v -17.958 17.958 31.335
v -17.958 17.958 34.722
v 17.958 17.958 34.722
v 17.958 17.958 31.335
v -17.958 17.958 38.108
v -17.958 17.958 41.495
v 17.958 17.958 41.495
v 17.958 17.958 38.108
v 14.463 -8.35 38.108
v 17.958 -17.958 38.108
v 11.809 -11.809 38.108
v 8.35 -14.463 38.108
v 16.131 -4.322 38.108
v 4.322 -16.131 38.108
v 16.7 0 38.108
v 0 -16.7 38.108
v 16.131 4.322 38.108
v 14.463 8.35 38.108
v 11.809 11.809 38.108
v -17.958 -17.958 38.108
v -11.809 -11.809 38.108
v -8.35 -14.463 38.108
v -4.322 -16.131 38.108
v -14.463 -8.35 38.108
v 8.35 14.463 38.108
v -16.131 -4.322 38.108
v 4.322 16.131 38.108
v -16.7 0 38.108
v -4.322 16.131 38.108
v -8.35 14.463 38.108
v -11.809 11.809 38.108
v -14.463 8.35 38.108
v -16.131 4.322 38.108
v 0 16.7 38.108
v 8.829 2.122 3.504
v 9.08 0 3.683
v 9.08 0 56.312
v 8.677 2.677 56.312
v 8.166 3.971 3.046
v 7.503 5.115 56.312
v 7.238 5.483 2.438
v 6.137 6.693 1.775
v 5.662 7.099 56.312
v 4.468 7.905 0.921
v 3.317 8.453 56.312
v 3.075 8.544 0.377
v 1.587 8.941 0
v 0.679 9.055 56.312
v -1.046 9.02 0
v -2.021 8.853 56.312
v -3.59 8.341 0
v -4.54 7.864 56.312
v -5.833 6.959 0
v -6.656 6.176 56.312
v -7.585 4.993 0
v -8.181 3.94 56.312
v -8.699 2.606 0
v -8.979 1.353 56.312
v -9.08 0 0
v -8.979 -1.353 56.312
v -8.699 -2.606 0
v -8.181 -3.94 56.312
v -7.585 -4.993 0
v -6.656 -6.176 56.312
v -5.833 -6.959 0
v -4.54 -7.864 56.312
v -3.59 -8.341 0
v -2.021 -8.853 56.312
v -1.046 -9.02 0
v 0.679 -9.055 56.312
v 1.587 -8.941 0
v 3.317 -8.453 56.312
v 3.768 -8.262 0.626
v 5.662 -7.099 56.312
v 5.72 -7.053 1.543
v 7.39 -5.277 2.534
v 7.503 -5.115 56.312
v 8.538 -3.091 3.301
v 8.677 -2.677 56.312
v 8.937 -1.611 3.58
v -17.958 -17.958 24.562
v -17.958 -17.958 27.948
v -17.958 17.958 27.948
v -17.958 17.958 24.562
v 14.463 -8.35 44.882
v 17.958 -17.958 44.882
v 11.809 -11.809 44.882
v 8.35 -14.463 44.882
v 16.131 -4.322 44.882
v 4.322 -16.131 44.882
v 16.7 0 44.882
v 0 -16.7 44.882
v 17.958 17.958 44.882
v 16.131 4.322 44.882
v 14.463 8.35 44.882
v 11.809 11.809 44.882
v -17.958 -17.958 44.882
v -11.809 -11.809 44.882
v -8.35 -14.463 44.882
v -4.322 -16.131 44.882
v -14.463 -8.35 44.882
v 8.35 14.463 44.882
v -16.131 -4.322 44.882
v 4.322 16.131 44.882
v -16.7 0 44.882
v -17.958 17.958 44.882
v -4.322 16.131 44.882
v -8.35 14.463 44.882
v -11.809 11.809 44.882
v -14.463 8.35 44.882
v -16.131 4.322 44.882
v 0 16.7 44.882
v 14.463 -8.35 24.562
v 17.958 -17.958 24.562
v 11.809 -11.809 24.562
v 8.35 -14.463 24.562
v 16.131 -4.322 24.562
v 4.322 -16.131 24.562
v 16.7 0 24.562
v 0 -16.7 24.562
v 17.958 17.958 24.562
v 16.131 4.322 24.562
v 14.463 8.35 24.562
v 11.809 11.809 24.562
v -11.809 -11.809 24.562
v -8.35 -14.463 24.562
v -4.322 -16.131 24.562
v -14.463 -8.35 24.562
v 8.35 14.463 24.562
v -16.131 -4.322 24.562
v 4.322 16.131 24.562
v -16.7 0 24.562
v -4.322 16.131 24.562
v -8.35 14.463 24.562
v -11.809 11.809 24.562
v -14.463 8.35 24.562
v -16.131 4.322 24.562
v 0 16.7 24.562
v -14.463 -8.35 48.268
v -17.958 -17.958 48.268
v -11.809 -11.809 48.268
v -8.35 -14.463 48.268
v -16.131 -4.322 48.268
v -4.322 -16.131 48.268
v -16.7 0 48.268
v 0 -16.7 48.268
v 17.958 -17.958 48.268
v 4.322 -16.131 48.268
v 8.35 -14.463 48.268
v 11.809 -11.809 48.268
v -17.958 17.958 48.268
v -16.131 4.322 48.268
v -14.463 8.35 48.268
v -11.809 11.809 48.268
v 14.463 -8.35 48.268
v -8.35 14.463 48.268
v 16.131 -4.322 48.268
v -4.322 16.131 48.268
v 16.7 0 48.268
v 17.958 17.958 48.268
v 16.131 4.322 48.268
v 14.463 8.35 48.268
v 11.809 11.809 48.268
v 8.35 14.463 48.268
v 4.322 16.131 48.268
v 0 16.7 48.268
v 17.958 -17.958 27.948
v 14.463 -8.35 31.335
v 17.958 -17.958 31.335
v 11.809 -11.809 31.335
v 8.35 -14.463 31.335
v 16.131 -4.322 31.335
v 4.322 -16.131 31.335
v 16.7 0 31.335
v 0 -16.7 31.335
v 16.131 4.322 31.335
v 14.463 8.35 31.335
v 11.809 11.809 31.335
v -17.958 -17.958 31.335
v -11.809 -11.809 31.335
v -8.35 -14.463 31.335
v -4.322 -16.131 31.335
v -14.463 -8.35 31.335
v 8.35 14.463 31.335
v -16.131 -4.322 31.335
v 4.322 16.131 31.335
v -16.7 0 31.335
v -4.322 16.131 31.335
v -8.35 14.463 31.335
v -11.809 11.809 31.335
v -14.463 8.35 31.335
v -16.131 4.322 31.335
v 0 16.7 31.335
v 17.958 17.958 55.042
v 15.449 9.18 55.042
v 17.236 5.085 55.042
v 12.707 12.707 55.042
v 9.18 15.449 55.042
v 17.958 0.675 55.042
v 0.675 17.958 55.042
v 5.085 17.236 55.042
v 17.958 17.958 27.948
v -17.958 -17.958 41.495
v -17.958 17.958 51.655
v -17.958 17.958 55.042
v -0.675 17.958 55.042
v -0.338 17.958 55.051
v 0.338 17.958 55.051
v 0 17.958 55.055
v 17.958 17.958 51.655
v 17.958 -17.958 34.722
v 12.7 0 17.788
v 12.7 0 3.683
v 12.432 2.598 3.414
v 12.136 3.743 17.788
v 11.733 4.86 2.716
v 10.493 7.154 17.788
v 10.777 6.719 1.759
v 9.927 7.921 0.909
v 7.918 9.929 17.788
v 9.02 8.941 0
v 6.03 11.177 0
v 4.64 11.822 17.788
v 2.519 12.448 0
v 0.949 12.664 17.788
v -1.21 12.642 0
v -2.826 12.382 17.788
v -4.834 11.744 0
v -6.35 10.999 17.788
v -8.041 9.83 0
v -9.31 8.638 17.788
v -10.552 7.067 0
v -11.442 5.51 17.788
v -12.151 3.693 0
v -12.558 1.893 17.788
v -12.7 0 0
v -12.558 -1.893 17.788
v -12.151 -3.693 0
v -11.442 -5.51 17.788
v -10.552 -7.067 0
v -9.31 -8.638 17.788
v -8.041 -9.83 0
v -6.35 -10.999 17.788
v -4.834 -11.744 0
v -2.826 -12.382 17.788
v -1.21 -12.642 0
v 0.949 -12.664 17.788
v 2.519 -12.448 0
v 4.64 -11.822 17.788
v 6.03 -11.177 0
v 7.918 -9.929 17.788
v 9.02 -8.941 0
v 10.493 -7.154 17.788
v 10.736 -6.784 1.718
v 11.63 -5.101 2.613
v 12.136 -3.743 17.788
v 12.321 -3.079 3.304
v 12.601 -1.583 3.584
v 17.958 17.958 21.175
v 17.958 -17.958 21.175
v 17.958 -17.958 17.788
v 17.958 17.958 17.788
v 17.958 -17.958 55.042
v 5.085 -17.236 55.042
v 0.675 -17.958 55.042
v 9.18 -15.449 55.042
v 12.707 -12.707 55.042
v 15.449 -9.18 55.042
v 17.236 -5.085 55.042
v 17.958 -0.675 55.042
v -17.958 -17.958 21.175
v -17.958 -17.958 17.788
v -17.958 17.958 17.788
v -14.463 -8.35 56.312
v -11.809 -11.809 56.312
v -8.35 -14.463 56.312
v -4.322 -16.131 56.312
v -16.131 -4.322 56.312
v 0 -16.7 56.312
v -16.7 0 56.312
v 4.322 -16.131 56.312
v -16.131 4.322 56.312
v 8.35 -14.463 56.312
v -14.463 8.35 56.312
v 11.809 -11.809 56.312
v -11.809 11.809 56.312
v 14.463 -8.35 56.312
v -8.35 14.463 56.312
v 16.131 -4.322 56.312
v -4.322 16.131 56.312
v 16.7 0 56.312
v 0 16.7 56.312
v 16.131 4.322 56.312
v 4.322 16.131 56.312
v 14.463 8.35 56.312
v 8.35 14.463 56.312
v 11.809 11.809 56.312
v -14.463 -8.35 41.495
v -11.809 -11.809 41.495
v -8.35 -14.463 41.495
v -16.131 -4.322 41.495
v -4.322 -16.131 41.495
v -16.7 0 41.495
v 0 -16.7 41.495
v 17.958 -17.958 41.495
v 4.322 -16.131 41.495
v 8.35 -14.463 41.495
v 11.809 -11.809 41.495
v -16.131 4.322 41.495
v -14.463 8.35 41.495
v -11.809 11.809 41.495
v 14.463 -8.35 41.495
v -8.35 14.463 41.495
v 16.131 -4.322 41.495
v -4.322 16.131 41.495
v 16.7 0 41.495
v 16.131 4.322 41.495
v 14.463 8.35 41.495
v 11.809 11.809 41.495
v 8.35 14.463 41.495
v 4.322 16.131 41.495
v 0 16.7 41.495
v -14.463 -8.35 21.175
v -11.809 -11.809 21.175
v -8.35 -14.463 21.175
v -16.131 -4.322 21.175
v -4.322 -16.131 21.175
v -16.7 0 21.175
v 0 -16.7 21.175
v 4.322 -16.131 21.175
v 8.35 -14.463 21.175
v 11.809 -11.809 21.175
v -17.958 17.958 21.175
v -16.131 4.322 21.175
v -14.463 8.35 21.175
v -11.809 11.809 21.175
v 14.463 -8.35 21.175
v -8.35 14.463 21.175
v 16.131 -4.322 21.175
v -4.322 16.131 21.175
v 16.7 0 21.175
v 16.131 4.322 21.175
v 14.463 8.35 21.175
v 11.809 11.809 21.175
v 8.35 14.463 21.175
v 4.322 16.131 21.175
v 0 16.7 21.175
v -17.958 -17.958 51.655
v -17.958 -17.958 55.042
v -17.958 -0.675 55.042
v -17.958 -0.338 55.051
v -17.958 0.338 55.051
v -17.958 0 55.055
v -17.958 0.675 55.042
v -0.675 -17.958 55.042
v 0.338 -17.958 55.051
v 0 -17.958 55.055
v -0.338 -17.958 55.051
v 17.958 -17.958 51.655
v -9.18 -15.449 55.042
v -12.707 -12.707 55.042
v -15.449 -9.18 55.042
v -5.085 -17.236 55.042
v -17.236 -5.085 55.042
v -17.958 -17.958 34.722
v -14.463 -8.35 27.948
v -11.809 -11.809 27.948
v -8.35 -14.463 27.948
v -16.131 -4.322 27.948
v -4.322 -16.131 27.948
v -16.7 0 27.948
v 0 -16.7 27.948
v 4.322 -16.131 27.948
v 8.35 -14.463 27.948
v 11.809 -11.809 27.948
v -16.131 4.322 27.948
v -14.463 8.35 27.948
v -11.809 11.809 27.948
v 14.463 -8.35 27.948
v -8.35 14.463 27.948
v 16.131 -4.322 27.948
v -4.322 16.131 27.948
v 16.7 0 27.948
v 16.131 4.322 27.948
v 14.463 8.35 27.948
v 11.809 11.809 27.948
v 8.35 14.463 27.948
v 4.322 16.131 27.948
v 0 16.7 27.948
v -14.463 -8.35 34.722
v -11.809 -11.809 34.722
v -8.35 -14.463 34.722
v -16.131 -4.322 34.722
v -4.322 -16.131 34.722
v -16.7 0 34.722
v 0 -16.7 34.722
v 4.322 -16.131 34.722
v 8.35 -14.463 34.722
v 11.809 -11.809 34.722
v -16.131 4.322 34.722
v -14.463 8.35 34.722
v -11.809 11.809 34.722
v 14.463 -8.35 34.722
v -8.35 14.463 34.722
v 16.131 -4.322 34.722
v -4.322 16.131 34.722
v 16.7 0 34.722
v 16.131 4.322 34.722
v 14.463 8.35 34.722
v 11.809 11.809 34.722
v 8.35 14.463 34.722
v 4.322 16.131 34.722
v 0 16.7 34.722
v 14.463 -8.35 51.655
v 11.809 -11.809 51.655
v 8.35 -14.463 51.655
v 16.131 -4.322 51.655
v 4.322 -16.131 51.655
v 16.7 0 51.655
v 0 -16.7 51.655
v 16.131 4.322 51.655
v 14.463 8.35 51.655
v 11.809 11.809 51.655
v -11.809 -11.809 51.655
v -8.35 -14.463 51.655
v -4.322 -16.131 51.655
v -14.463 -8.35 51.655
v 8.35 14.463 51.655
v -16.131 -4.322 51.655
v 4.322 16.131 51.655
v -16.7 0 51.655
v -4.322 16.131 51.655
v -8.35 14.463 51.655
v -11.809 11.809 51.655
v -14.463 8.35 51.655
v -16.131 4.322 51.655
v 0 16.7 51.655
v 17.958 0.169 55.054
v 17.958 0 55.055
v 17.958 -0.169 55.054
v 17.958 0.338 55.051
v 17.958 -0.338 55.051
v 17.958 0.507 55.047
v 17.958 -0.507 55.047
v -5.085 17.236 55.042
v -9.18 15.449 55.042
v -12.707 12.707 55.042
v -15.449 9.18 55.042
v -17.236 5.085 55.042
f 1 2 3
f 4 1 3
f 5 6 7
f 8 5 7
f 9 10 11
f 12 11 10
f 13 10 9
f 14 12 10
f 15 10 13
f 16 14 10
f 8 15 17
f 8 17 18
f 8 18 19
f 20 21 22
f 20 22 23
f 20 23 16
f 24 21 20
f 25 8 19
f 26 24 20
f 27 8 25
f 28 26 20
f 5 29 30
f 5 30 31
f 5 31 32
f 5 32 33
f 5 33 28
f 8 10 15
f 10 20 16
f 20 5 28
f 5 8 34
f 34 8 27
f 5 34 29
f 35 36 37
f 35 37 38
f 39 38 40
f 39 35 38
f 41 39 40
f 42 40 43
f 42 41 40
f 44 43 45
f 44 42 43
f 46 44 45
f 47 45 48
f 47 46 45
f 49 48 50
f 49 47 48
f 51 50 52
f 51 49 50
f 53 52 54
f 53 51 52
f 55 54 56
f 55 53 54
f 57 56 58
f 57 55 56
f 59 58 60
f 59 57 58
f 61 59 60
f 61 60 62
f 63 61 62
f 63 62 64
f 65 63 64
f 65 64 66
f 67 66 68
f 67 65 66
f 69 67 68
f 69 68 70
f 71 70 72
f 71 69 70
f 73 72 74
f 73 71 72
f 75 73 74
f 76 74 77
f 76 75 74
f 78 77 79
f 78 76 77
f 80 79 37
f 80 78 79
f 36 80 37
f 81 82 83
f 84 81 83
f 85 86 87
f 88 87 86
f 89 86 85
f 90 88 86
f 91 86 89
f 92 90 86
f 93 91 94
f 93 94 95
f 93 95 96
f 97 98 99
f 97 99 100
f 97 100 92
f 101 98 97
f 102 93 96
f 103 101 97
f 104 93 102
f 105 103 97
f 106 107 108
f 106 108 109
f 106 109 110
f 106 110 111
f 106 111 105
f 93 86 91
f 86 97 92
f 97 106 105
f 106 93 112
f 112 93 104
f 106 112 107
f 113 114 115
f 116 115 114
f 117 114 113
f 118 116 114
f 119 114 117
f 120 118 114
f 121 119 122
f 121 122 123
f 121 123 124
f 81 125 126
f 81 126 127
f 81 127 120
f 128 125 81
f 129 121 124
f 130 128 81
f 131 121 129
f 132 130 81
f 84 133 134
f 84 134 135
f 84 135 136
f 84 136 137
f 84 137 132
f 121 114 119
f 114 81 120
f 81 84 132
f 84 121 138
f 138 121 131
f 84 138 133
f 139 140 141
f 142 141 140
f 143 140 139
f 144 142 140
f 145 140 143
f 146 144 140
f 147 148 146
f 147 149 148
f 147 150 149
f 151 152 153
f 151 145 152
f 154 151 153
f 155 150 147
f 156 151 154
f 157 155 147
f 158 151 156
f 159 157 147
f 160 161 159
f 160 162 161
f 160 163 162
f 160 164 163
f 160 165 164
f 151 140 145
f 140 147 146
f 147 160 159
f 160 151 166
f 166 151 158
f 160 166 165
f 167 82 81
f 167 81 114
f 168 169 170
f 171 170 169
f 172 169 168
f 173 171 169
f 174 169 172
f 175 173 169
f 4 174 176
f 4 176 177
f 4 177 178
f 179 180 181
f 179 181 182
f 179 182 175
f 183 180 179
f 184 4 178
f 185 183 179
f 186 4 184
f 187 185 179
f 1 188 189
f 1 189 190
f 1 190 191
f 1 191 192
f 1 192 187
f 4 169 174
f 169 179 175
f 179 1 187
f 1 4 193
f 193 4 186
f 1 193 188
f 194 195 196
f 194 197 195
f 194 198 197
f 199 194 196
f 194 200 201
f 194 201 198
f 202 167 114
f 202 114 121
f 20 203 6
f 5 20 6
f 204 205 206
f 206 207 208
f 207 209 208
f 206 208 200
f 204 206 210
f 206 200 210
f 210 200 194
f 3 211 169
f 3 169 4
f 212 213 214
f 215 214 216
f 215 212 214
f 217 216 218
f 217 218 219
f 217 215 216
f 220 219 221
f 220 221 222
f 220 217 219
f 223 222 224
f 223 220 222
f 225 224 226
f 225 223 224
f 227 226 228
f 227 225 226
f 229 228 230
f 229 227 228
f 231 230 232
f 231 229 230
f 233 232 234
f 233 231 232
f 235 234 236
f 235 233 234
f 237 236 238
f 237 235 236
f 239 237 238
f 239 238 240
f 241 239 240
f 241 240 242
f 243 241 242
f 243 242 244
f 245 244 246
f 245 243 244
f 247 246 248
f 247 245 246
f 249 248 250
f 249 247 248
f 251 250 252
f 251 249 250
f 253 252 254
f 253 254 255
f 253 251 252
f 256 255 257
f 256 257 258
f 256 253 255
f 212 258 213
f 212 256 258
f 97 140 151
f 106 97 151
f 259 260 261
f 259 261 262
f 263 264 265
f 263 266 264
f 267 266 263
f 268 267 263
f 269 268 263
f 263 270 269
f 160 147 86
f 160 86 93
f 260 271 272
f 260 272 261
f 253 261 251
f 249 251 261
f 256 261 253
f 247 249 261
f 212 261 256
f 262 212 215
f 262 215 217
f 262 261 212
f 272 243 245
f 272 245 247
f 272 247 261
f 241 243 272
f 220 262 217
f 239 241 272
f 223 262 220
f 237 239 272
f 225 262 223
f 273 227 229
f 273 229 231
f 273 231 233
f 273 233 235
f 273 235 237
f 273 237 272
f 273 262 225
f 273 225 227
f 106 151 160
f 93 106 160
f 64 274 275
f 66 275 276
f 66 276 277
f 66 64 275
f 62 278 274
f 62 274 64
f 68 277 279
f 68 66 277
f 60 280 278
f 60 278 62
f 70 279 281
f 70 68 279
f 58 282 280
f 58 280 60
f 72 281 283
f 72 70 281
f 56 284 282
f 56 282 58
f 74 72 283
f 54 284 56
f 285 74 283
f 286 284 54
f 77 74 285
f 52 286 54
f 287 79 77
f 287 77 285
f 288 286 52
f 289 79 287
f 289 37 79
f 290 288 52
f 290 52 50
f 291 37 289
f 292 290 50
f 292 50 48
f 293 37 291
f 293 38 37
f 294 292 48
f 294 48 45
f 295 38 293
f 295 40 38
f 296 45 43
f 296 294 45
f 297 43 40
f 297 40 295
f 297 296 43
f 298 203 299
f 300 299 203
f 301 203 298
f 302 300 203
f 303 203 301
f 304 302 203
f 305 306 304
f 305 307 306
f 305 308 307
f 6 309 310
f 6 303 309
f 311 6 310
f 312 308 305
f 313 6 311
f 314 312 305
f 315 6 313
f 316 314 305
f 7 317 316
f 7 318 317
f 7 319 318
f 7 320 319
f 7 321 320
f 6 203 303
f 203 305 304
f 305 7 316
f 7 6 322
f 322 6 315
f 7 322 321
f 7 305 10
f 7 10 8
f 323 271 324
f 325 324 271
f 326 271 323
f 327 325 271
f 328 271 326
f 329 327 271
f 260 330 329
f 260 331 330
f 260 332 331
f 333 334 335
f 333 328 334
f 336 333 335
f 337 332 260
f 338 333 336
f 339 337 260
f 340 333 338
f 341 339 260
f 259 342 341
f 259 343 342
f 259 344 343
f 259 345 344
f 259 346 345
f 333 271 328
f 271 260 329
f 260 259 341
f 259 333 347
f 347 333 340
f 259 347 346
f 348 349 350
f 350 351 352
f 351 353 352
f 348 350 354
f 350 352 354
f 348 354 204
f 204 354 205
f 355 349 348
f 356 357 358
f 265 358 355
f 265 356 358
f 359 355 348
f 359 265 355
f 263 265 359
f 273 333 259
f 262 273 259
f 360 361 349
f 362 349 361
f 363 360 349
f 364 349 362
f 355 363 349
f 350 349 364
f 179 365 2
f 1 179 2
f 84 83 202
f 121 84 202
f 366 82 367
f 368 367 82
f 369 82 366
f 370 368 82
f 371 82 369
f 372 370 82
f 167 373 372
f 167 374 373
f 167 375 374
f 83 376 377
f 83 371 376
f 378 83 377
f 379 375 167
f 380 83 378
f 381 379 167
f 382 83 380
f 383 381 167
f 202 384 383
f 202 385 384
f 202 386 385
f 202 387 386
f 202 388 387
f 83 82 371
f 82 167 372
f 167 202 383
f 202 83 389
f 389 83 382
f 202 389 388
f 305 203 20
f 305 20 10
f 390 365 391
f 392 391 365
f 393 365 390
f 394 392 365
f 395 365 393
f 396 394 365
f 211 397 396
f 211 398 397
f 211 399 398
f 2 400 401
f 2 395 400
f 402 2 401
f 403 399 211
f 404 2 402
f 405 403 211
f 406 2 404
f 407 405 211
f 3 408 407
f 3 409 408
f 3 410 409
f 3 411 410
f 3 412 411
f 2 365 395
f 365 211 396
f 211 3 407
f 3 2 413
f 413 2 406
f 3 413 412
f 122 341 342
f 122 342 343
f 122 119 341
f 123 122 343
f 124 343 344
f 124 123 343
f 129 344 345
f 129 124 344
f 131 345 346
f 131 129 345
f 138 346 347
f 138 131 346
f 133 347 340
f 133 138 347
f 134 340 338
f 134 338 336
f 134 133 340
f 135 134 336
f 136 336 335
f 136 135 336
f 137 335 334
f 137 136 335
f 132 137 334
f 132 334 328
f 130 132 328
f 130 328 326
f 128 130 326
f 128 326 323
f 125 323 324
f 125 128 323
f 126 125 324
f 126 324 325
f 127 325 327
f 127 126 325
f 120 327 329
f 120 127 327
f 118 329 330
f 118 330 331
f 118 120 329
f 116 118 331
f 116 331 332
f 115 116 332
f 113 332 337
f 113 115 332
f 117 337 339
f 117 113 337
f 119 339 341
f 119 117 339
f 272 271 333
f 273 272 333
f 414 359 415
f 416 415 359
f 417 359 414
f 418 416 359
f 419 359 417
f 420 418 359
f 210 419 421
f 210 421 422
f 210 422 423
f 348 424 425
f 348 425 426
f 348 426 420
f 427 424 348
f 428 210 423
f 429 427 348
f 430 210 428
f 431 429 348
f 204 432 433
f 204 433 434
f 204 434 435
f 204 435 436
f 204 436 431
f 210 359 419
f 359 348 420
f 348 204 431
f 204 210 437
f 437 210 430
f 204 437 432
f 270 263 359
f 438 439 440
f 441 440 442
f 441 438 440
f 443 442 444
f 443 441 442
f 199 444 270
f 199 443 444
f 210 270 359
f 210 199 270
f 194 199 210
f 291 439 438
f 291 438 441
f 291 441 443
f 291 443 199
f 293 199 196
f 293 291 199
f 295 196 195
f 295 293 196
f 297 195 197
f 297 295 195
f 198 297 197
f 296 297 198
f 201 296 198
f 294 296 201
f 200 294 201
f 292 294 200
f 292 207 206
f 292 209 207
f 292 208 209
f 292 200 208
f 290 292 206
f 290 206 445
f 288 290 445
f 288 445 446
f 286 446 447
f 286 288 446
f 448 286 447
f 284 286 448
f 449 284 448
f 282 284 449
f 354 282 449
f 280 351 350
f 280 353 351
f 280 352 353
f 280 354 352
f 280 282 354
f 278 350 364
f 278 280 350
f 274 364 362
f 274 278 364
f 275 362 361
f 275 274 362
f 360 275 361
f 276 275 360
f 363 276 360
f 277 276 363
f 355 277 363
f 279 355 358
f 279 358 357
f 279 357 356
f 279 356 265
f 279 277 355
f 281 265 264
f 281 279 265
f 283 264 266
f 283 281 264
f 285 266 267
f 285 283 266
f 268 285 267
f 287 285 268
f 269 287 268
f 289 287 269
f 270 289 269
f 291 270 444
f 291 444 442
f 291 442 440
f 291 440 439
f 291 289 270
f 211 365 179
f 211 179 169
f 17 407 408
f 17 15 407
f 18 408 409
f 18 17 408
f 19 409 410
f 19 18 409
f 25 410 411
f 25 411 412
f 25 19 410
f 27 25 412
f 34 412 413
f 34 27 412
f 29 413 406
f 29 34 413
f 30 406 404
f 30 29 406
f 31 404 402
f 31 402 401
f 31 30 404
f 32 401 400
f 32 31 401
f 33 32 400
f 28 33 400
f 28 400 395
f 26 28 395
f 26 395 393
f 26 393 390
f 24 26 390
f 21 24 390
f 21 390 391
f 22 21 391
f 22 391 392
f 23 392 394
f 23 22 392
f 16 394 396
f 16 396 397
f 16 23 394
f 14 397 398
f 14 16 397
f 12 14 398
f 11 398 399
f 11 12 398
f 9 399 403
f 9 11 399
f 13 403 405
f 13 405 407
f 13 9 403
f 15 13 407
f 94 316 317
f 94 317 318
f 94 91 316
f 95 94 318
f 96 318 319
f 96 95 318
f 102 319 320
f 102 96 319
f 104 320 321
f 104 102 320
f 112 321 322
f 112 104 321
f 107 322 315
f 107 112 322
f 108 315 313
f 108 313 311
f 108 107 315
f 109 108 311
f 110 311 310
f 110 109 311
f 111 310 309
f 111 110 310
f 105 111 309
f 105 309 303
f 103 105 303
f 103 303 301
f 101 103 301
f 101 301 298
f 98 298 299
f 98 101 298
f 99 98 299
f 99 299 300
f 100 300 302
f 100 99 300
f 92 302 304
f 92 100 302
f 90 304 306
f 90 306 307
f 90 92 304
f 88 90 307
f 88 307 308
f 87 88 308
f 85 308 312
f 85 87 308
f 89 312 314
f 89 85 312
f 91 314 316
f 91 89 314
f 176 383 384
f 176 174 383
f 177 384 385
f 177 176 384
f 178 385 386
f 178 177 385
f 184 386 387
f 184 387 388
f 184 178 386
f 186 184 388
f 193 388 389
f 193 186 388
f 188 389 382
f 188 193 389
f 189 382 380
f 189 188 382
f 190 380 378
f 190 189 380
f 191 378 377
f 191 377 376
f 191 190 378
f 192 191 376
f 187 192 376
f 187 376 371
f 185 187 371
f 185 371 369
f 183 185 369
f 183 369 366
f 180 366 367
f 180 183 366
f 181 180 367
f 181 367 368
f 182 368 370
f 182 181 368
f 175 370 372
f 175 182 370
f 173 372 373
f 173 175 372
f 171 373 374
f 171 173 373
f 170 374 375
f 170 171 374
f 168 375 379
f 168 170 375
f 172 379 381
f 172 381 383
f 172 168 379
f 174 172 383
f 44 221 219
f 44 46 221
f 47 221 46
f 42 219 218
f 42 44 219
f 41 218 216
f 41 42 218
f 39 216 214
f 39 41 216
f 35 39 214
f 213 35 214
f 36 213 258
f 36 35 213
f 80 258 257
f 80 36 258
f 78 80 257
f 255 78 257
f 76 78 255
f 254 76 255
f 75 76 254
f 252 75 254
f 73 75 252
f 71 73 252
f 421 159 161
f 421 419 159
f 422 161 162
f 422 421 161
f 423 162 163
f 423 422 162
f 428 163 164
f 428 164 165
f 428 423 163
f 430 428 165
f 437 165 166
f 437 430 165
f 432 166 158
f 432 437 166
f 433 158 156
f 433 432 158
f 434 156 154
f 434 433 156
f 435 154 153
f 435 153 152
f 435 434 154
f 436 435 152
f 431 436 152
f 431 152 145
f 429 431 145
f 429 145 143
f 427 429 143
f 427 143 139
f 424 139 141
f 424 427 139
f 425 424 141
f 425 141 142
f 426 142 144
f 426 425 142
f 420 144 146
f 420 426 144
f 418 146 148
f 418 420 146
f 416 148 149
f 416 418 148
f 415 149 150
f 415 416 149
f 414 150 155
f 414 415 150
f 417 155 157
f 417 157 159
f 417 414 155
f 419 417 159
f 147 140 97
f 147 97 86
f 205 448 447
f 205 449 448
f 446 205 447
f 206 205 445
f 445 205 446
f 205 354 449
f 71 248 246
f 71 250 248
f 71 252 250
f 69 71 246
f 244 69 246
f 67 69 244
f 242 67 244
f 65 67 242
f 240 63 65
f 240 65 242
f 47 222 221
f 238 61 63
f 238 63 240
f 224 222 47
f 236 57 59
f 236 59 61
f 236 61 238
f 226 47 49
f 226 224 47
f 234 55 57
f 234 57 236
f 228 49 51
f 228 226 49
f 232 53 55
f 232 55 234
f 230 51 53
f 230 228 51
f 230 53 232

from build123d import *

# Parameters (mm, degrees)
F2_W     = 35.9156
F2_H     = 35.9156
F3_DEPTH = 56.3128
F5_DEPTH = 13.7000001


with BuildPart() as f1:
    # F0 (on Front) → F1 (revolve)
    with BuildSketch(Plane.XZ):
        Polygon((12.8905, 56.3118), (12.8905, 55.0418), (17.9705, 55.0418), (16.7005, 56.3118), align=None)
        Polygon((17.9705, 55.0418), (12.8905, 55.0418), (12.8905, 17.7884666667), (17.9705, 17.7884666667), (50.8, 17.7884666667), (50.8, 21.1751333333), (16.7005, 21.1751333333), (16.7005, 24.5618), (50.8, 24.5618), (50.8, 27.9484666667), (16.7005, 27.9484666667), (16.7005, 31.3351333333), (50.8, 31.3351333333), (50.8, 34.7218), (16.7005, 34.7218), (16.7005, 38.1084666667), (50.8, 38.1084666667), (50.8, 41.4951333333), (16.7005, 41.4951333333), (16.7005, 44.8818), (50.8, 44.8818), (50.8, 48.2684666667), (16.7005, 48.2684666667), (16.7005, 51.6551333333), (50.8, 51.6551333333), (50.8, 55.0418), align=None)
        Polygon((12.8905, 17.7884666667), (12.8905, 55.0418), (12.8905, 56.3118), (9.0805, 56.3118), (9.0805, 0), (12.7, 0), (12.7, 17.7884666667), align=None)
    revolve(axis=Axis((0, 0, 27.5209), (0, 0, 1)))

    # F2 (on face) → F3 (cut, through all)
    with BuildSketch(Plane.XY.offset(56.3118)):
        with BuildLine():
            ThreePointArc((50.8, 0), (35.9210245024, 35.9210244661), (5.14e-08, 50.8))
            ThreePointArc((5.14e-08, 50.8), (-35.9210245011, 35.9210244675), (-50.8, -9.89e-08))
            ThreePointArc((-50.8, -9.89e-08), (-35.9210244493, -35.9210245192), (0, -50.8))
            ThreePointArc((0, -50.8), (35.9210244843, -35.9210244843), (50.8, 0))
        make_face()
        Rectangle(F2_W, F2_H, mode=Mode.SUBTRACT)
    extrude(amount=-F3_DEPTH, mode=Mode.SUBTRACT)

    # F4 (on Right) → F5 (cut, up to face)
    with BuildSketch(Plane.YZ):
        with BuildLine():
            ThreePointArc((-8.9408, 0), (-4.8805494132, -20.7288154777), (12.6937813793, -9.0107813793))
            ThreePointArc((12.6937813793, -9.0107813793), (11.7180340984, -4.1302319661), (8.9408, 0))
            Line((8.9408, 0), (-8.9408, 0))
        make_face()
        with BuildLine():
            Line((-8.9408, 0), (8.9408, 0))
            ThreePointArc((8.9408, 0), (0, 3.683), (-8.9408, 0))
        make_face()
    extrude(amount=F5_DEPTH, mode=Mode.SUBTRACT)


solid = f1.part
